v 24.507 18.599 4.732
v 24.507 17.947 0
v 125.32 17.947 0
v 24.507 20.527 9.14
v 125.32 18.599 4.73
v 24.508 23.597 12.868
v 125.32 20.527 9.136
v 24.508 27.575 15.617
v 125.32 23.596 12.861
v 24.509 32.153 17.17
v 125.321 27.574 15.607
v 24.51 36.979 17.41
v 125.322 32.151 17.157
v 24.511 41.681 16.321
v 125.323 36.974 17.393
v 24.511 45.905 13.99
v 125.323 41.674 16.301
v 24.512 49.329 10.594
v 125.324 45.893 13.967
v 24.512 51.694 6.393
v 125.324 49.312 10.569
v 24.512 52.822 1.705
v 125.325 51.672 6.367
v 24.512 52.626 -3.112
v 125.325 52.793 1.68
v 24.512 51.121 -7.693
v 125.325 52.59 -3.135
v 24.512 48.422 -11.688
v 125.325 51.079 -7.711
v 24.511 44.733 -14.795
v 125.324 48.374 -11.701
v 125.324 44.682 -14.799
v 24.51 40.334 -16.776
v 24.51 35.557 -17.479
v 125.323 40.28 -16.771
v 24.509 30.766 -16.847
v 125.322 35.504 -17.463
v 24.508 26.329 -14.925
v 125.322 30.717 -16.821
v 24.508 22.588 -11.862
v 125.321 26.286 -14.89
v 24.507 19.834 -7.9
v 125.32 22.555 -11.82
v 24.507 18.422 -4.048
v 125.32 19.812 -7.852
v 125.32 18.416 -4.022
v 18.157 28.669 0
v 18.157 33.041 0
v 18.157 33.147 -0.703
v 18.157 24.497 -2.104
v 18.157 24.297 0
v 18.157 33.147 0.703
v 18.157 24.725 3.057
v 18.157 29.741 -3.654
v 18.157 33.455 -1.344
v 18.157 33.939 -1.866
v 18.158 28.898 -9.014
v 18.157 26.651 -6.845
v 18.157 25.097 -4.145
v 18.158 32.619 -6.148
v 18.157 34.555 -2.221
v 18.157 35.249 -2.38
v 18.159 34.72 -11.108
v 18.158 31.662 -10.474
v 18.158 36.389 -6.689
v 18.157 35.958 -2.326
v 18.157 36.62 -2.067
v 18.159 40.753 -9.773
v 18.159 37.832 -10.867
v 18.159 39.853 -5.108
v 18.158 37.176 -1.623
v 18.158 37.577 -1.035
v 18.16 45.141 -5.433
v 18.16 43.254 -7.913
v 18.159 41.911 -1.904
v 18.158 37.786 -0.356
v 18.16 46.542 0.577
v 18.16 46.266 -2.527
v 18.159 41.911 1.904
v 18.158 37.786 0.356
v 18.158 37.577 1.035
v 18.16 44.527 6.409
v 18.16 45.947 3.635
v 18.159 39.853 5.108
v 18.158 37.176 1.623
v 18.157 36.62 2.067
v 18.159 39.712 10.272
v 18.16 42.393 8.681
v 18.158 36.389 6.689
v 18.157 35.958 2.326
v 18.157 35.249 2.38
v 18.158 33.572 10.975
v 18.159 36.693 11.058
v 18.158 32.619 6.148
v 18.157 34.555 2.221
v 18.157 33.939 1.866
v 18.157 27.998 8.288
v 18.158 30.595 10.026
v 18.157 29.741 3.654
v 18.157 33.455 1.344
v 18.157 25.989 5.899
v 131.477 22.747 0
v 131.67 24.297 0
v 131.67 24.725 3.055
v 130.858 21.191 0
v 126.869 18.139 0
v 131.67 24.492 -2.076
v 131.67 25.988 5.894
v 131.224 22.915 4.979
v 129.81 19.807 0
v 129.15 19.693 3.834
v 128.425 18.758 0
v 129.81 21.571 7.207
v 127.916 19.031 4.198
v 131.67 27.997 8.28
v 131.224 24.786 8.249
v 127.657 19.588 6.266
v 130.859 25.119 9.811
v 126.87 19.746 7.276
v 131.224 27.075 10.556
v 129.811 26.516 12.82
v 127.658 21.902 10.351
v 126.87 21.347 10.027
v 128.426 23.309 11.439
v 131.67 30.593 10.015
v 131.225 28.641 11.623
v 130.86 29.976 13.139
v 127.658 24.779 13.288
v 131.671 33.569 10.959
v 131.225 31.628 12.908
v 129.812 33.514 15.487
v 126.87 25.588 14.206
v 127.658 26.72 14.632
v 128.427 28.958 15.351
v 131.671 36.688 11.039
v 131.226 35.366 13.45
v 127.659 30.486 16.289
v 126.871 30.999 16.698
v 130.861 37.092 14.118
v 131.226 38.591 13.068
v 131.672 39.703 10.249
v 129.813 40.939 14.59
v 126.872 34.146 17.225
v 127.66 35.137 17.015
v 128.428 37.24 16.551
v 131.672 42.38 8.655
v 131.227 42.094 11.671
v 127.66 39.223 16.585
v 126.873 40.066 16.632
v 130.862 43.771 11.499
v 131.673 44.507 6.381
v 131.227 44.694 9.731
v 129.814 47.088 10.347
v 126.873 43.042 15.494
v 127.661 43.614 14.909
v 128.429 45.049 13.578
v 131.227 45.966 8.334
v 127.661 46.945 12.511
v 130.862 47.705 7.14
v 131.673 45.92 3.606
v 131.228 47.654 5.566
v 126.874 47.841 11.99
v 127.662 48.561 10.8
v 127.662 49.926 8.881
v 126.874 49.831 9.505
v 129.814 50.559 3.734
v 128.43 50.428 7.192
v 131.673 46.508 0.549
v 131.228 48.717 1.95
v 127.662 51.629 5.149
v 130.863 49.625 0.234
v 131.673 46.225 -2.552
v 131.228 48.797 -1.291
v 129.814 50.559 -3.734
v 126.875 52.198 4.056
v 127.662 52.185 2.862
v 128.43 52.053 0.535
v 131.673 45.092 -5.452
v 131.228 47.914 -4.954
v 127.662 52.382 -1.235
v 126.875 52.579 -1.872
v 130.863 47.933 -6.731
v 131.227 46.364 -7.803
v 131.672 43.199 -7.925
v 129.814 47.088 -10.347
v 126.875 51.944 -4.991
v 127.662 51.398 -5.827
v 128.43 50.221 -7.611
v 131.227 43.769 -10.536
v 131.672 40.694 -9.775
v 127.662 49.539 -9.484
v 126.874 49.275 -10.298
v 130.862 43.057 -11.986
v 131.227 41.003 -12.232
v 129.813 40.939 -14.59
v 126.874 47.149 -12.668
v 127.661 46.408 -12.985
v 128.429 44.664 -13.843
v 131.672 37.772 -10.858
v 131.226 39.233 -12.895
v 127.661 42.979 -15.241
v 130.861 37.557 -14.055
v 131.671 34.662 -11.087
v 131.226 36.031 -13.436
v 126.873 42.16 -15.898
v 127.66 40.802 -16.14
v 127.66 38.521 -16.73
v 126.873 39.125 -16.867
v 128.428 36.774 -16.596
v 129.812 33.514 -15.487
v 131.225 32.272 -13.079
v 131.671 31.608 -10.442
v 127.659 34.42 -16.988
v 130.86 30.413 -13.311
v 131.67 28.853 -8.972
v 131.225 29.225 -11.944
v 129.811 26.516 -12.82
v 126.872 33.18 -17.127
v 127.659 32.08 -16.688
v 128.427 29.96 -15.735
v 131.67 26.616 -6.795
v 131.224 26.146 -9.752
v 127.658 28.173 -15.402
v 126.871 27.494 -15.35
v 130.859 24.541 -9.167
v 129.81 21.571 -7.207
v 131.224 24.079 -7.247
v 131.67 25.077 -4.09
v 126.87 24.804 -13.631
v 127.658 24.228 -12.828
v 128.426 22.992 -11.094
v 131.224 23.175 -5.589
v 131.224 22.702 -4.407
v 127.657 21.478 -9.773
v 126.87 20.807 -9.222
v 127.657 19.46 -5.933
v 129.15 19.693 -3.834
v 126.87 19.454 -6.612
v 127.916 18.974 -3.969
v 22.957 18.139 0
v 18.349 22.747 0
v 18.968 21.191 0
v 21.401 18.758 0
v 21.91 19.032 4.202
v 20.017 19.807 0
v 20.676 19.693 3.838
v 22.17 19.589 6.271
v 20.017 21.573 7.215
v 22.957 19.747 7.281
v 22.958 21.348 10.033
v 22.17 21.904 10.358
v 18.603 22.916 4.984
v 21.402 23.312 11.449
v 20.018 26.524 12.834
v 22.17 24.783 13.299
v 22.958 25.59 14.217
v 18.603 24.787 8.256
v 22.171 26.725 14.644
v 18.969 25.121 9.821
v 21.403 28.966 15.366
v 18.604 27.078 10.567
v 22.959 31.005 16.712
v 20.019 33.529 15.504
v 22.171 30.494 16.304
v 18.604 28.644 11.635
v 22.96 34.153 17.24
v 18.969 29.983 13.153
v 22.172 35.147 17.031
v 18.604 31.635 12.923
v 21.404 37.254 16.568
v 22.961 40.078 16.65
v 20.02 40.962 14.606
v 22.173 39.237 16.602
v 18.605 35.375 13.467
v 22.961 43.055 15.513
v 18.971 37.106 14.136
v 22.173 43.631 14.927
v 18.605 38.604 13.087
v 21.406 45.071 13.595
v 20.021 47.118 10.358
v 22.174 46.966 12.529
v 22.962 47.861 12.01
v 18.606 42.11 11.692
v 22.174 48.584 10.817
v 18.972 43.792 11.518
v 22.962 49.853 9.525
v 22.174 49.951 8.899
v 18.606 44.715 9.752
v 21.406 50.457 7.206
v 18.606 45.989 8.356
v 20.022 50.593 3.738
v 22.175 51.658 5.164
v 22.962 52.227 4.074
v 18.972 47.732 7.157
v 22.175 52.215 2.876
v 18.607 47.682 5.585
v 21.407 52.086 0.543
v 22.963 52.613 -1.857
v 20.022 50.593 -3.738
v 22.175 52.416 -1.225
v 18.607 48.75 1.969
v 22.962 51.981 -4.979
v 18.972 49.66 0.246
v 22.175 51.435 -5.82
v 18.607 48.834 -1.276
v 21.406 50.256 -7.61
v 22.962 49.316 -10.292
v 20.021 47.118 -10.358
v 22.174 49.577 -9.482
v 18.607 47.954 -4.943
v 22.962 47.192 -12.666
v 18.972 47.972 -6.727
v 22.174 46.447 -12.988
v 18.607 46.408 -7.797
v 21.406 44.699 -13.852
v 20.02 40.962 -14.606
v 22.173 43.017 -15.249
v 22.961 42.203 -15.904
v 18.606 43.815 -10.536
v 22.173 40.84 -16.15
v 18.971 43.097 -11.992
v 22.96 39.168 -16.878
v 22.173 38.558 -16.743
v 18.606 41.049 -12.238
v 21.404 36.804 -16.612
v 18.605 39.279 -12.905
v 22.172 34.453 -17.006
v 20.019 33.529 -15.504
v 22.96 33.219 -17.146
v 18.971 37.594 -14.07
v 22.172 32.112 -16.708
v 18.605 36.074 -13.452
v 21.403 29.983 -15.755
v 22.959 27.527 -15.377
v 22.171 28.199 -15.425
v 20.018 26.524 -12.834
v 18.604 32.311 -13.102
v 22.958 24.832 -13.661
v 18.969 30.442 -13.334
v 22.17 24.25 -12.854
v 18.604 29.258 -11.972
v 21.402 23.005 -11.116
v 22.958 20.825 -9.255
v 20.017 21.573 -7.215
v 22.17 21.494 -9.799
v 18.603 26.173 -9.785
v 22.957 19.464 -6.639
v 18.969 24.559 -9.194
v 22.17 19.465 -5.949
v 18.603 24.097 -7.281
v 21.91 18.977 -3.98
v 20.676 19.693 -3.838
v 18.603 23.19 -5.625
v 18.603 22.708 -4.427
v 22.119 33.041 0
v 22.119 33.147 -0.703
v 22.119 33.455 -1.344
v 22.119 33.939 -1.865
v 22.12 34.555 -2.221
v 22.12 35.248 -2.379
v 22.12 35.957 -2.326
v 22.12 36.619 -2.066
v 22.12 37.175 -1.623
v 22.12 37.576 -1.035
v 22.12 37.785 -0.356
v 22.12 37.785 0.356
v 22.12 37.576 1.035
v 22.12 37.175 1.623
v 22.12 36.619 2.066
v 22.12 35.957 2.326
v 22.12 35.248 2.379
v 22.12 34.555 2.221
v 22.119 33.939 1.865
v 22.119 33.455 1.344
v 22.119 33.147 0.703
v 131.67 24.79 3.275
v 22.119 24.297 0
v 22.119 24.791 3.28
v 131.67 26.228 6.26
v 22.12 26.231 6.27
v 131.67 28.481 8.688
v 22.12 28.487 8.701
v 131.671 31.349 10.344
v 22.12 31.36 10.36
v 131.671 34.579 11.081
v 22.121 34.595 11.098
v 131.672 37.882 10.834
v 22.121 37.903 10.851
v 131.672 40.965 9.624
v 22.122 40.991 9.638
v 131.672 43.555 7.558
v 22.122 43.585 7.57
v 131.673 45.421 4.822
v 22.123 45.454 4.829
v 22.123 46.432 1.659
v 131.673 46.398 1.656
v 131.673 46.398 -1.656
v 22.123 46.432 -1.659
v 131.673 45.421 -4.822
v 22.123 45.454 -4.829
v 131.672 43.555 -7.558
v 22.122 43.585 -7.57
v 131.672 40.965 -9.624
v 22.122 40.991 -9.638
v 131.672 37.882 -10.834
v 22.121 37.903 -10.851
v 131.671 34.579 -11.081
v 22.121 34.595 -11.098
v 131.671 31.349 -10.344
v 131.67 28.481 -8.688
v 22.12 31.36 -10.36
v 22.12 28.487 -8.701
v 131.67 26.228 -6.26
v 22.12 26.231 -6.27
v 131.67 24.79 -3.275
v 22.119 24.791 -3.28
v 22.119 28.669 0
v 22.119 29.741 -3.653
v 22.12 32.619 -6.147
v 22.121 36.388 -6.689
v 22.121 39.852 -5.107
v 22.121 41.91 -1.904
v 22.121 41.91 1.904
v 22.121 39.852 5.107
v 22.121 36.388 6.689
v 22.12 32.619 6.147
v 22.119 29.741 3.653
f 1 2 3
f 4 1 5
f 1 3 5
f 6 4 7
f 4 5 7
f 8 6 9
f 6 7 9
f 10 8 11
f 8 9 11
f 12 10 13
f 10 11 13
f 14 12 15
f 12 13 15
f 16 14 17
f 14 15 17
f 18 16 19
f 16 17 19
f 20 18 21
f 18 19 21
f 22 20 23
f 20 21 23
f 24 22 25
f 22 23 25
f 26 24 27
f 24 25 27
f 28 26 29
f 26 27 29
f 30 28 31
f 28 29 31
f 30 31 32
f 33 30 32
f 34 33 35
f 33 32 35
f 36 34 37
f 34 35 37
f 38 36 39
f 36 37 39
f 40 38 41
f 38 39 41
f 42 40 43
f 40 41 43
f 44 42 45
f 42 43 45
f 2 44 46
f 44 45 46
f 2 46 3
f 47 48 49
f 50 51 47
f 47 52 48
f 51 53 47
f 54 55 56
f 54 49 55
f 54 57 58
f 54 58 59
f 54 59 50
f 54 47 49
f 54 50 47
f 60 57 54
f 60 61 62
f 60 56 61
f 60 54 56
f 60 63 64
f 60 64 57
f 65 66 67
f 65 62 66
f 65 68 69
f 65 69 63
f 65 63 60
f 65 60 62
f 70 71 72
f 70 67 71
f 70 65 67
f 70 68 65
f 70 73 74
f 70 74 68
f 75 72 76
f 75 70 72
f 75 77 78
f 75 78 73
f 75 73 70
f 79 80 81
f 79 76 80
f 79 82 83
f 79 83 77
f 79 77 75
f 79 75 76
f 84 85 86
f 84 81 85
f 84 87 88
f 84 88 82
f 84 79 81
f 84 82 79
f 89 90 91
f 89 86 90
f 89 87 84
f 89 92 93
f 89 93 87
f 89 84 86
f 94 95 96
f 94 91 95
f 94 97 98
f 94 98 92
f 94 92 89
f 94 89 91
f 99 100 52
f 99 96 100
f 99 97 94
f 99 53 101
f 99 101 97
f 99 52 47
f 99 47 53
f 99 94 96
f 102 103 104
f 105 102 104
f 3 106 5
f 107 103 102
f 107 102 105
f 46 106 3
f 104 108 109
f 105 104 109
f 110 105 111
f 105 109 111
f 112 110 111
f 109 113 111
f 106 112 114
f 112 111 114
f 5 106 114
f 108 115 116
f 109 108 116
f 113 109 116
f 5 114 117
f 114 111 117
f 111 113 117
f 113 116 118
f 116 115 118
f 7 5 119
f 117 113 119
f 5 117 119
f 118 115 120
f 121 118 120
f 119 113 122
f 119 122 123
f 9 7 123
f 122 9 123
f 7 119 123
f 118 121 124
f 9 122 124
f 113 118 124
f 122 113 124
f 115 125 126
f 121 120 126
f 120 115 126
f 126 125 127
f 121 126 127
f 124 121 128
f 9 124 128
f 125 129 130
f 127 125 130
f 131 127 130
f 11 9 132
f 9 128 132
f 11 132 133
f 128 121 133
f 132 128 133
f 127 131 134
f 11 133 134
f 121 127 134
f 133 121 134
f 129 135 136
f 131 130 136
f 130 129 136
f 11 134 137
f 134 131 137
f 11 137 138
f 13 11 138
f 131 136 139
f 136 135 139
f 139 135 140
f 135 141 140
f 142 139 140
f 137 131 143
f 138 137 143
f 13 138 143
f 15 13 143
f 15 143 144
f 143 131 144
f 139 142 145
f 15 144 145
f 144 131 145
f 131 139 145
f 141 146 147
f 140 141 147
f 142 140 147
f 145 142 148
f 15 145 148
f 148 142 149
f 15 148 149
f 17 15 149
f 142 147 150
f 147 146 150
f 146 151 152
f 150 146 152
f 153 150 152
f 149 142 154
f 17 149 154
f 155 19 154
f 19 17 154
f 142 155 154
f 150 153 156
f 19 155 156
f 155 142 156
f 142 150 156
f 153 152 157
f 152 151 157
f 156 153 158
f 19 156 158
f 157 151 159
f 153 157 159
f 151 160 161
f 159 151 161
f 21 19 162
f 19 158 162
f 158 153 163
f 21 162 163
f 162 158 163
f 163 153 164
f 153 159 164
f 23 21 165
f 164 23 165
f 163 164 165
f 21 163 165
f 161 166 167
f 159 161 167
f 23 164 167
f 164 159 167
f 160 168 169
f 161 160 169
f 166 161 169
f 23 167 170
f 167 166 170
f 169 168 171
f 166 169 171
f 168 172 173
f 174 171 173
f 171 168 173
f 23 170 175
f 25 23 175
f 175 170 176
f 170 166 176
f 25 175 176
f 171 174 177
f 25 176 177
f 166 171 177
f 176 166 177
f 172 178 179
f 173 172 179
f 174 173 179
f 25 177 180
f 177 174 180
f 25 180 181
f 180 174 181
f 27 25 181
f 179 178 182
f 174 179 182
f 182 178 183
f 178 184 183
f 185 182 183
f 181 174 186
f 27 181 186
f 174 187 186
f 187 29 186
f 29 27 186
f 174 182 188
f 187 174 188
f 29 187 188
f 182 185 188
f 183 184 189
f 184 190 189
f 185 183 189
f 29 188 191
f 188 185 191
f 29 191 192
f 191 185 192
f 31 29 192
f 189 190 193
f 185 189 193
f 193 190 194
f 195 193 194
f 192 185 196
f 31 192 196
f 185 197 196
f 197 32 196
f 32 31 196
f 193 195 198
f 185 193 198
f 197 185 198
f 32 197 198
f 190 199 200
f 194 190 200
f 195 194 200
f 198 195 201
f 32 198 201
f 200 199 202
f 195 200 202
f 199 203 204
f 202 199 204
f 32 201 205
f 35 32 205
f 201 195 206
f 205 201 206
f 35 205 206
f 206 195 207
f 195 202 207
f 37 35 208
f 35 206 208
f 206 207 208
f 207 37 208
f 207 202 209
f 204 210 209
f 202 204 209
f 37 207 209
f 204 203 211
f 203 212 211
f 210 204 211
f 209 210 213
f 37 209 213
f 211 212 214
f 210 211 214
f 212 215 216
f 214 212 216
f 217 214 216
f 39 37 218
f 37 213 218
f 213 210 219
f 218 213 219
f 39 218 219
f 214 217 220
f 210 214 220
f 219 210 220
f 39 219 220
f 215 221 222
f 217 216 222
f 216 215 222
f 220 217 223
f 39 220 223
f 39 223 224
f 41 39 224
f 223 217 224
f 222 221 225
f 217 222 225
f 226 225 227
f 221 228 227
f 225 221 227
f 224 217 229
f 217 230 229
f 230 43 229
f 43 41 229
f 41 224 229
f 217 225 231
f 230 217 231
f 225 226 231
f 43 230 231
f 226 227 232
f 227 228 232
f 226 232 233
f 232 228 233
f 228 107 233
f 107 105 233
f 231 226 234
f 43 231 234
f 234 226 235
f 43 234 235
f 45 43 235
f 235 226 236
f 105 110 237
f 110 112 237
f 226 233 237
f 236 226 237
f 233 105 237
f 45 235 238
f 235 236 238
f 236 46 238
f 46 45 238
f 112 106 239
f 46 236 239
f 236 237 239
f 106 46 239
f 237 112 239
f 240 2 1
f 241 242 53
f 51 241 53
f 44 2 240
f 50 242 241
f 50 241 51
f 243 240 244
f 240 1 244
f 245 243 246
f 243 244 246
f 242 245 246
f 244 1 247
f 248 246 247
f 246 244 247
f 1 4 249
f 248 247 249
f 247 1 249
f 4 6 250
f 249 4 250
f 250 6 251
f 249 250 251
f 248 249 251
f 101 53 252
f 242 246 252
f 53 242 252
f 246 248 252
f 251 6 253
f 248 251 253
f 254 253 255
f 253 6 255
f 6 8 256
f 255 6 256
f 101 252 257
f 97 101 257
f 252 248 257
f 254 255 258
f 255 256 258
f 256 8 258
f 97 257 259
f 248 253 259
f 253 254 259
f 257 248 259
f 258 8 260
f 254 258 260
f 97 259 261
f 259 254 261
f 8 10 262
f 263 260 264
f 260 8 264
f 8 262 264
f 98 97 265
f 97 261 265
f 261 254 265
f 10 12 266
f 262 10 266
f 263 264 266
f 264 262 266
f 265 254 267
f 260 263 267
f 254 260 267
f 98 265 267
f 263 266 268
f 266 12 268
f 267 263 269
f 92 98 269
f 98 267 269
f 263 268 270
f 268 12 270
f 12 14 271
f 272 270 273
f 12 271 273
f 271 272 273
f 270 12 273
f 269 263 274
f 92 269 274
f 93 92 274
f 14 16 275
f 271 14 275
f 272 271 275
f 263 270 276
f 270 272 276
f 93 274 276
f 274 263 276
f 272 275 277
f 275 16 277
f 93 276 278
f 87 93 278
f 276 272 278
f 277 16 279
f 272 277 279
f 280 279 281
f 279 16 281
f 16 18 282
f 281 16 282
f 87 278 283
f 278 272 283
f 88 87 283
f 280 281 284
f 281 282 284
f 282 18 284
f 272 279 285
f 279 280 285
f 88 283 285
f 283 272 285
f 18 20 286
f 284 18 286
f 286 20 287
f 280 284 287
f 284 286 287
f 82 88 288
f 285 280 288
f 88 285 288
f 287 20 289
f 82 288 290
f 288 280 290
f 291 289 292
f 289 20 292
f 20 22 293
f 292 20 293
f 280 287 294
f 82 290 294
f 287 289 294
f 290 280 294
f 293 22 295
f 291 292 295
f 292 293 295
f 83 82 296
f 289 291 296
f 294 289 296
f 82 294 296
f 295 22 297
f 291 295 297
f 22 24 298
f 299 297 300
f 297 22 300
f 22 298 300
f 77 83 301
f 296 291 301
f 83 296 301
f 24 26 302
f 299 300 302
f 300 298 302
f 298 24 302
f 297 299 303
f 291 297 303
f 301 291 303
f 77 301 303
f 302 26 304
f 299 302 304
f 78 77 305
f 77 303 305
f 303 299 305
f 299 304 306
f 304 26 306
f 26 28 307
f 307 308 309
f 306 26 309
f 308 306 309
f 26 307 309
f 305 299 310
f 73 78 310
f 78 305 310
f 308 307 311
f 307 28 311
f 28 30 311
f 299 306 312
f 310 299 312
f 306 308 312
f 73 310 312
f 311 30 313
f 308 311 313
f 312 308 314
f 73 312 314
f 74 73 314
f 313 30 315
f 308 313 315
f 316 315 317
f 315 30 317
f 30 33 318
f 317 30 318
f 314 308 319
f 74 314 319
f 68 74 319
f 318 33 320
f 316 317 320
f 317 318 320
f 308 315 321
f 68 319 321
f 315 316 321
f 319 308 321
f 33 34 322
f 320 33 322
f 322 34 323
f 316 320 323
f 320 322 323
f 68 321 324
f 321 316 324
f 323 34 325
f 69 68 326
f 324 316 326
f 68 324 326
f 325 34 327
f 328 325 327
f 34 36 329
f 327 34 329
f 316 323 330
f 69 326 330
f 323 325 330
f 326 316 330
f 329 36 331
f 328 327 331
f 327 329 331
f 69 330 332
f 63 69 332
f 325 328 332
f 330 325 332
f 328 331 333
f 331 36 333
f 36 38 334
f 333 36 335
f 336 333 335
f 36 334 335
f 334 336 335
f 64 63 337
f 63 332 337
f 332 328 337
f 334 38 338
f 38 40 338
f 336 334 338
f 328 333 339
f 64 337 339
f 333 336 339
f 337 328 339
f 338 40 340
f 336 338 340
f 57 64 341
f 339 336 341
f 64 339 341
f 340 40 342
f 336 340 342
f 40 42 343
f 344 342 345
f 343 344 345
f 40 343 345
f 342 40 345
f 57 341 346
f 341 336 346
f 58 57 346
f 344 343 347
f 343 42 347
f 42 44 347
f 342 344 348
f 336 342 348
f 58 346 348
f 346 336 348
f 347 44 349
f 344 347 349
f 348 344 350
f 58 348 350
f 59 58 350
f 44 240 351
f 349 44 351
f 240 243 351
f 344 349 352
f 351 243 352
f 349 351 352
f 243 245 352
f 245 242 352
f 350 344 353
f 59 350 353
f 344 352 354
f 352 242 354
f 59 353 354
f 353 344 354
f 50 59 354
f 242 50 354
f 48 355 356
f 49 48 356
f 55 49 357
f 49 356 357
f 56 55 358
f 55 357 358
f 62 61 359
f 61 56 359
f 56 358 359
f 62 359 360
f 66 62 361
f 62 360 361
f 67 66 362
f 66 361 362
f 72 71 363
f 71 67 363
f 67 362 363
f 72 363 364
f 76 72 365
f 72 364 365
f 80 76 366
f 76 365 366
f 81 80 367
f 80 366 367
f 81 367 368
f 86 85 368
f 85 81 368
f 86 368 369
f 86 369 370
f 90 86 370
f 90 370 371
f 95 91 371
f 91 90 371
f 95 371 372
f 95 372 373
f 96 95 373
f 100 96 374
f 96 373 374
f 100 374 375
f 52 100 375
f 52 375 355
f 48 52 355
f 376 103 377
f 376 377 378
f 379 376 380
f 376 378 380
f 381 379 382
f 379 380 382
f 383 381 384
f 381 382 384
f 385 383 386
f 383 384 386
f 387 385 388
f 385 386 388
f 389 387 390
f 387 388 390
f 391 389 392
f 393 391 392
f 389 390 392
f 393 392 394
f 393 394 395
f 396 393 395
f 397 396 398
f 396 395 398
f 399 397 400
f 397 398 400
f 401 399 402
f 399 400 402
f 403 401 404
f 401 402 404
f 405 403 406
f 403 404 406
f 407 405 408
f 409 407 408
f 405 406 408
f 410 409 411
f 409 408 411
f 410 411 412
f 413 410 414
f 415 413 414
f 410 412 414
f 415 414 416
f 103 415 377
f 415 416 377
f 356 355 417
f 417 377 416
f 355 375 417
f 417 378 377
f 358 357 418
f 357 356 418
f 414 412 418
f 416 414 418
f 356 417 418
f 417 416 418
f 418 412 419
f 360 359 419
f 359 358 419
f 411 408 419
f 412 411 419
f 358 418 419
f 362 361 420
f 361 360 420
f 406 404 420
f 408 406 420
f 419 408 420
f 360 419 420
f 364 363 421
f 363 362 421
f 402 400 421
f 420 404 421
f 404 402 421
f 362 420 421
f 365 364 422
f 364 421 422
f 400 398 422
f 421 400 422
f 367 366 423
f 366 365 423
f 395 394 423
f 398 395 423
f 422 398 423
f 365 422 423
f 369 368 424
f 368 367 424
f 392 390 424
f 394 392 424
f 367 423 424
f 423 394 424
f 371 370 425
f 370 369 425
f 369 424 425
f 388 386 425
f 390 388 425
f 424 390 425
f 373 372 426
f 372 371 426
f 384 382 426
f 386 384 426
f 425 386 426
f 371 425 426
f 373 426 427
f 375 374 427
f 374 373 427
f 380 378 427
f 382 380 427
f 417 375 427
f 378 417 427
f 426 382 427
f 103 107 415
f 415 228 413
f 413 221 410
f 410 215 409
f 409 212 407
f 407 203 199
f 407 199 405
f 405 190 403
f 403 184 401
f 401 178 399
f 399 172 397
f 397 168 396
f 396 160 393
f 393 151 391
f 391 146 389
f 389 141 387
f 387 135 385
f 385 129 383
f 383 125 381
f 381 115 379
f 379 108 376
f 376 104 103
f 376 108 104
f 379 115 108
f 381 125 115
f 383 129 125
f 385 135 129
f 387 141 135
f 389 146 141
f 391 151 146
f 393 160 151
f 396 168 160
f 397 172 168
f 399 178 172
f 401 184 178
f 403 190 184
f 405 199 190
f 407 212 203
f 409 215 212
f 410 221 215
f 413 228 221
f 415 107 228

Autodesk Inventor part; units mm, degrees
ref_plane "YZ Plane" through (0, 0, 0) normal (1, 0, 0) x (0, 1, 0)
ref_plane "XZ Plane" through (0, 0, 0) normal (0, 1, 0) x (-1, 0, 0)
ref_plane "XY Plane" through (0, 0, 0) normal (0, 0, 1) x (1, 0, 0)
sketch "Sketch1" plane through (0, 0, 0) normal (0, 0, 1) x (1, 0, 0)
  line L0 (131.6695, 17.9467) -> (18.1569, 17.9467) construction
  line L1 (18.1569, 17.9467) -> (131.6695, 17.9467)
  line L2 (131.6695, 17.9467) -> (131.6695, 24.2967)
  line L3 (131.6695, 24.2967) -> (22.1193, 24.2967)
  line L4 (18.1569, 17.9467) -> (18.1569, 33.0406)
  line L5 (18.1569, 33.0406) -> (22.1193, 33.0406)
  line L6 (22.1193, 33.0406) -> (22.1193, 24.2967)
  line L7 (131.6695, 35.4092) -> (50.1187, 35.4219) construction
  dimension "d3" = 113.5126
revolve "Revolution1" add sketch "Sketch1" angle 360 about axis through (131.6695, 35.4092, 0) along (-1, 0.0001557, 0)
fillet "Fillet1" radius 6.35 1 edges at (131.6749, 52.8717, 0)
fillet "Fillet2" radius 6.35 1 edges at (18.1623, 52.9071, 0)
properties part number "RubberHandleSleeveTL"
